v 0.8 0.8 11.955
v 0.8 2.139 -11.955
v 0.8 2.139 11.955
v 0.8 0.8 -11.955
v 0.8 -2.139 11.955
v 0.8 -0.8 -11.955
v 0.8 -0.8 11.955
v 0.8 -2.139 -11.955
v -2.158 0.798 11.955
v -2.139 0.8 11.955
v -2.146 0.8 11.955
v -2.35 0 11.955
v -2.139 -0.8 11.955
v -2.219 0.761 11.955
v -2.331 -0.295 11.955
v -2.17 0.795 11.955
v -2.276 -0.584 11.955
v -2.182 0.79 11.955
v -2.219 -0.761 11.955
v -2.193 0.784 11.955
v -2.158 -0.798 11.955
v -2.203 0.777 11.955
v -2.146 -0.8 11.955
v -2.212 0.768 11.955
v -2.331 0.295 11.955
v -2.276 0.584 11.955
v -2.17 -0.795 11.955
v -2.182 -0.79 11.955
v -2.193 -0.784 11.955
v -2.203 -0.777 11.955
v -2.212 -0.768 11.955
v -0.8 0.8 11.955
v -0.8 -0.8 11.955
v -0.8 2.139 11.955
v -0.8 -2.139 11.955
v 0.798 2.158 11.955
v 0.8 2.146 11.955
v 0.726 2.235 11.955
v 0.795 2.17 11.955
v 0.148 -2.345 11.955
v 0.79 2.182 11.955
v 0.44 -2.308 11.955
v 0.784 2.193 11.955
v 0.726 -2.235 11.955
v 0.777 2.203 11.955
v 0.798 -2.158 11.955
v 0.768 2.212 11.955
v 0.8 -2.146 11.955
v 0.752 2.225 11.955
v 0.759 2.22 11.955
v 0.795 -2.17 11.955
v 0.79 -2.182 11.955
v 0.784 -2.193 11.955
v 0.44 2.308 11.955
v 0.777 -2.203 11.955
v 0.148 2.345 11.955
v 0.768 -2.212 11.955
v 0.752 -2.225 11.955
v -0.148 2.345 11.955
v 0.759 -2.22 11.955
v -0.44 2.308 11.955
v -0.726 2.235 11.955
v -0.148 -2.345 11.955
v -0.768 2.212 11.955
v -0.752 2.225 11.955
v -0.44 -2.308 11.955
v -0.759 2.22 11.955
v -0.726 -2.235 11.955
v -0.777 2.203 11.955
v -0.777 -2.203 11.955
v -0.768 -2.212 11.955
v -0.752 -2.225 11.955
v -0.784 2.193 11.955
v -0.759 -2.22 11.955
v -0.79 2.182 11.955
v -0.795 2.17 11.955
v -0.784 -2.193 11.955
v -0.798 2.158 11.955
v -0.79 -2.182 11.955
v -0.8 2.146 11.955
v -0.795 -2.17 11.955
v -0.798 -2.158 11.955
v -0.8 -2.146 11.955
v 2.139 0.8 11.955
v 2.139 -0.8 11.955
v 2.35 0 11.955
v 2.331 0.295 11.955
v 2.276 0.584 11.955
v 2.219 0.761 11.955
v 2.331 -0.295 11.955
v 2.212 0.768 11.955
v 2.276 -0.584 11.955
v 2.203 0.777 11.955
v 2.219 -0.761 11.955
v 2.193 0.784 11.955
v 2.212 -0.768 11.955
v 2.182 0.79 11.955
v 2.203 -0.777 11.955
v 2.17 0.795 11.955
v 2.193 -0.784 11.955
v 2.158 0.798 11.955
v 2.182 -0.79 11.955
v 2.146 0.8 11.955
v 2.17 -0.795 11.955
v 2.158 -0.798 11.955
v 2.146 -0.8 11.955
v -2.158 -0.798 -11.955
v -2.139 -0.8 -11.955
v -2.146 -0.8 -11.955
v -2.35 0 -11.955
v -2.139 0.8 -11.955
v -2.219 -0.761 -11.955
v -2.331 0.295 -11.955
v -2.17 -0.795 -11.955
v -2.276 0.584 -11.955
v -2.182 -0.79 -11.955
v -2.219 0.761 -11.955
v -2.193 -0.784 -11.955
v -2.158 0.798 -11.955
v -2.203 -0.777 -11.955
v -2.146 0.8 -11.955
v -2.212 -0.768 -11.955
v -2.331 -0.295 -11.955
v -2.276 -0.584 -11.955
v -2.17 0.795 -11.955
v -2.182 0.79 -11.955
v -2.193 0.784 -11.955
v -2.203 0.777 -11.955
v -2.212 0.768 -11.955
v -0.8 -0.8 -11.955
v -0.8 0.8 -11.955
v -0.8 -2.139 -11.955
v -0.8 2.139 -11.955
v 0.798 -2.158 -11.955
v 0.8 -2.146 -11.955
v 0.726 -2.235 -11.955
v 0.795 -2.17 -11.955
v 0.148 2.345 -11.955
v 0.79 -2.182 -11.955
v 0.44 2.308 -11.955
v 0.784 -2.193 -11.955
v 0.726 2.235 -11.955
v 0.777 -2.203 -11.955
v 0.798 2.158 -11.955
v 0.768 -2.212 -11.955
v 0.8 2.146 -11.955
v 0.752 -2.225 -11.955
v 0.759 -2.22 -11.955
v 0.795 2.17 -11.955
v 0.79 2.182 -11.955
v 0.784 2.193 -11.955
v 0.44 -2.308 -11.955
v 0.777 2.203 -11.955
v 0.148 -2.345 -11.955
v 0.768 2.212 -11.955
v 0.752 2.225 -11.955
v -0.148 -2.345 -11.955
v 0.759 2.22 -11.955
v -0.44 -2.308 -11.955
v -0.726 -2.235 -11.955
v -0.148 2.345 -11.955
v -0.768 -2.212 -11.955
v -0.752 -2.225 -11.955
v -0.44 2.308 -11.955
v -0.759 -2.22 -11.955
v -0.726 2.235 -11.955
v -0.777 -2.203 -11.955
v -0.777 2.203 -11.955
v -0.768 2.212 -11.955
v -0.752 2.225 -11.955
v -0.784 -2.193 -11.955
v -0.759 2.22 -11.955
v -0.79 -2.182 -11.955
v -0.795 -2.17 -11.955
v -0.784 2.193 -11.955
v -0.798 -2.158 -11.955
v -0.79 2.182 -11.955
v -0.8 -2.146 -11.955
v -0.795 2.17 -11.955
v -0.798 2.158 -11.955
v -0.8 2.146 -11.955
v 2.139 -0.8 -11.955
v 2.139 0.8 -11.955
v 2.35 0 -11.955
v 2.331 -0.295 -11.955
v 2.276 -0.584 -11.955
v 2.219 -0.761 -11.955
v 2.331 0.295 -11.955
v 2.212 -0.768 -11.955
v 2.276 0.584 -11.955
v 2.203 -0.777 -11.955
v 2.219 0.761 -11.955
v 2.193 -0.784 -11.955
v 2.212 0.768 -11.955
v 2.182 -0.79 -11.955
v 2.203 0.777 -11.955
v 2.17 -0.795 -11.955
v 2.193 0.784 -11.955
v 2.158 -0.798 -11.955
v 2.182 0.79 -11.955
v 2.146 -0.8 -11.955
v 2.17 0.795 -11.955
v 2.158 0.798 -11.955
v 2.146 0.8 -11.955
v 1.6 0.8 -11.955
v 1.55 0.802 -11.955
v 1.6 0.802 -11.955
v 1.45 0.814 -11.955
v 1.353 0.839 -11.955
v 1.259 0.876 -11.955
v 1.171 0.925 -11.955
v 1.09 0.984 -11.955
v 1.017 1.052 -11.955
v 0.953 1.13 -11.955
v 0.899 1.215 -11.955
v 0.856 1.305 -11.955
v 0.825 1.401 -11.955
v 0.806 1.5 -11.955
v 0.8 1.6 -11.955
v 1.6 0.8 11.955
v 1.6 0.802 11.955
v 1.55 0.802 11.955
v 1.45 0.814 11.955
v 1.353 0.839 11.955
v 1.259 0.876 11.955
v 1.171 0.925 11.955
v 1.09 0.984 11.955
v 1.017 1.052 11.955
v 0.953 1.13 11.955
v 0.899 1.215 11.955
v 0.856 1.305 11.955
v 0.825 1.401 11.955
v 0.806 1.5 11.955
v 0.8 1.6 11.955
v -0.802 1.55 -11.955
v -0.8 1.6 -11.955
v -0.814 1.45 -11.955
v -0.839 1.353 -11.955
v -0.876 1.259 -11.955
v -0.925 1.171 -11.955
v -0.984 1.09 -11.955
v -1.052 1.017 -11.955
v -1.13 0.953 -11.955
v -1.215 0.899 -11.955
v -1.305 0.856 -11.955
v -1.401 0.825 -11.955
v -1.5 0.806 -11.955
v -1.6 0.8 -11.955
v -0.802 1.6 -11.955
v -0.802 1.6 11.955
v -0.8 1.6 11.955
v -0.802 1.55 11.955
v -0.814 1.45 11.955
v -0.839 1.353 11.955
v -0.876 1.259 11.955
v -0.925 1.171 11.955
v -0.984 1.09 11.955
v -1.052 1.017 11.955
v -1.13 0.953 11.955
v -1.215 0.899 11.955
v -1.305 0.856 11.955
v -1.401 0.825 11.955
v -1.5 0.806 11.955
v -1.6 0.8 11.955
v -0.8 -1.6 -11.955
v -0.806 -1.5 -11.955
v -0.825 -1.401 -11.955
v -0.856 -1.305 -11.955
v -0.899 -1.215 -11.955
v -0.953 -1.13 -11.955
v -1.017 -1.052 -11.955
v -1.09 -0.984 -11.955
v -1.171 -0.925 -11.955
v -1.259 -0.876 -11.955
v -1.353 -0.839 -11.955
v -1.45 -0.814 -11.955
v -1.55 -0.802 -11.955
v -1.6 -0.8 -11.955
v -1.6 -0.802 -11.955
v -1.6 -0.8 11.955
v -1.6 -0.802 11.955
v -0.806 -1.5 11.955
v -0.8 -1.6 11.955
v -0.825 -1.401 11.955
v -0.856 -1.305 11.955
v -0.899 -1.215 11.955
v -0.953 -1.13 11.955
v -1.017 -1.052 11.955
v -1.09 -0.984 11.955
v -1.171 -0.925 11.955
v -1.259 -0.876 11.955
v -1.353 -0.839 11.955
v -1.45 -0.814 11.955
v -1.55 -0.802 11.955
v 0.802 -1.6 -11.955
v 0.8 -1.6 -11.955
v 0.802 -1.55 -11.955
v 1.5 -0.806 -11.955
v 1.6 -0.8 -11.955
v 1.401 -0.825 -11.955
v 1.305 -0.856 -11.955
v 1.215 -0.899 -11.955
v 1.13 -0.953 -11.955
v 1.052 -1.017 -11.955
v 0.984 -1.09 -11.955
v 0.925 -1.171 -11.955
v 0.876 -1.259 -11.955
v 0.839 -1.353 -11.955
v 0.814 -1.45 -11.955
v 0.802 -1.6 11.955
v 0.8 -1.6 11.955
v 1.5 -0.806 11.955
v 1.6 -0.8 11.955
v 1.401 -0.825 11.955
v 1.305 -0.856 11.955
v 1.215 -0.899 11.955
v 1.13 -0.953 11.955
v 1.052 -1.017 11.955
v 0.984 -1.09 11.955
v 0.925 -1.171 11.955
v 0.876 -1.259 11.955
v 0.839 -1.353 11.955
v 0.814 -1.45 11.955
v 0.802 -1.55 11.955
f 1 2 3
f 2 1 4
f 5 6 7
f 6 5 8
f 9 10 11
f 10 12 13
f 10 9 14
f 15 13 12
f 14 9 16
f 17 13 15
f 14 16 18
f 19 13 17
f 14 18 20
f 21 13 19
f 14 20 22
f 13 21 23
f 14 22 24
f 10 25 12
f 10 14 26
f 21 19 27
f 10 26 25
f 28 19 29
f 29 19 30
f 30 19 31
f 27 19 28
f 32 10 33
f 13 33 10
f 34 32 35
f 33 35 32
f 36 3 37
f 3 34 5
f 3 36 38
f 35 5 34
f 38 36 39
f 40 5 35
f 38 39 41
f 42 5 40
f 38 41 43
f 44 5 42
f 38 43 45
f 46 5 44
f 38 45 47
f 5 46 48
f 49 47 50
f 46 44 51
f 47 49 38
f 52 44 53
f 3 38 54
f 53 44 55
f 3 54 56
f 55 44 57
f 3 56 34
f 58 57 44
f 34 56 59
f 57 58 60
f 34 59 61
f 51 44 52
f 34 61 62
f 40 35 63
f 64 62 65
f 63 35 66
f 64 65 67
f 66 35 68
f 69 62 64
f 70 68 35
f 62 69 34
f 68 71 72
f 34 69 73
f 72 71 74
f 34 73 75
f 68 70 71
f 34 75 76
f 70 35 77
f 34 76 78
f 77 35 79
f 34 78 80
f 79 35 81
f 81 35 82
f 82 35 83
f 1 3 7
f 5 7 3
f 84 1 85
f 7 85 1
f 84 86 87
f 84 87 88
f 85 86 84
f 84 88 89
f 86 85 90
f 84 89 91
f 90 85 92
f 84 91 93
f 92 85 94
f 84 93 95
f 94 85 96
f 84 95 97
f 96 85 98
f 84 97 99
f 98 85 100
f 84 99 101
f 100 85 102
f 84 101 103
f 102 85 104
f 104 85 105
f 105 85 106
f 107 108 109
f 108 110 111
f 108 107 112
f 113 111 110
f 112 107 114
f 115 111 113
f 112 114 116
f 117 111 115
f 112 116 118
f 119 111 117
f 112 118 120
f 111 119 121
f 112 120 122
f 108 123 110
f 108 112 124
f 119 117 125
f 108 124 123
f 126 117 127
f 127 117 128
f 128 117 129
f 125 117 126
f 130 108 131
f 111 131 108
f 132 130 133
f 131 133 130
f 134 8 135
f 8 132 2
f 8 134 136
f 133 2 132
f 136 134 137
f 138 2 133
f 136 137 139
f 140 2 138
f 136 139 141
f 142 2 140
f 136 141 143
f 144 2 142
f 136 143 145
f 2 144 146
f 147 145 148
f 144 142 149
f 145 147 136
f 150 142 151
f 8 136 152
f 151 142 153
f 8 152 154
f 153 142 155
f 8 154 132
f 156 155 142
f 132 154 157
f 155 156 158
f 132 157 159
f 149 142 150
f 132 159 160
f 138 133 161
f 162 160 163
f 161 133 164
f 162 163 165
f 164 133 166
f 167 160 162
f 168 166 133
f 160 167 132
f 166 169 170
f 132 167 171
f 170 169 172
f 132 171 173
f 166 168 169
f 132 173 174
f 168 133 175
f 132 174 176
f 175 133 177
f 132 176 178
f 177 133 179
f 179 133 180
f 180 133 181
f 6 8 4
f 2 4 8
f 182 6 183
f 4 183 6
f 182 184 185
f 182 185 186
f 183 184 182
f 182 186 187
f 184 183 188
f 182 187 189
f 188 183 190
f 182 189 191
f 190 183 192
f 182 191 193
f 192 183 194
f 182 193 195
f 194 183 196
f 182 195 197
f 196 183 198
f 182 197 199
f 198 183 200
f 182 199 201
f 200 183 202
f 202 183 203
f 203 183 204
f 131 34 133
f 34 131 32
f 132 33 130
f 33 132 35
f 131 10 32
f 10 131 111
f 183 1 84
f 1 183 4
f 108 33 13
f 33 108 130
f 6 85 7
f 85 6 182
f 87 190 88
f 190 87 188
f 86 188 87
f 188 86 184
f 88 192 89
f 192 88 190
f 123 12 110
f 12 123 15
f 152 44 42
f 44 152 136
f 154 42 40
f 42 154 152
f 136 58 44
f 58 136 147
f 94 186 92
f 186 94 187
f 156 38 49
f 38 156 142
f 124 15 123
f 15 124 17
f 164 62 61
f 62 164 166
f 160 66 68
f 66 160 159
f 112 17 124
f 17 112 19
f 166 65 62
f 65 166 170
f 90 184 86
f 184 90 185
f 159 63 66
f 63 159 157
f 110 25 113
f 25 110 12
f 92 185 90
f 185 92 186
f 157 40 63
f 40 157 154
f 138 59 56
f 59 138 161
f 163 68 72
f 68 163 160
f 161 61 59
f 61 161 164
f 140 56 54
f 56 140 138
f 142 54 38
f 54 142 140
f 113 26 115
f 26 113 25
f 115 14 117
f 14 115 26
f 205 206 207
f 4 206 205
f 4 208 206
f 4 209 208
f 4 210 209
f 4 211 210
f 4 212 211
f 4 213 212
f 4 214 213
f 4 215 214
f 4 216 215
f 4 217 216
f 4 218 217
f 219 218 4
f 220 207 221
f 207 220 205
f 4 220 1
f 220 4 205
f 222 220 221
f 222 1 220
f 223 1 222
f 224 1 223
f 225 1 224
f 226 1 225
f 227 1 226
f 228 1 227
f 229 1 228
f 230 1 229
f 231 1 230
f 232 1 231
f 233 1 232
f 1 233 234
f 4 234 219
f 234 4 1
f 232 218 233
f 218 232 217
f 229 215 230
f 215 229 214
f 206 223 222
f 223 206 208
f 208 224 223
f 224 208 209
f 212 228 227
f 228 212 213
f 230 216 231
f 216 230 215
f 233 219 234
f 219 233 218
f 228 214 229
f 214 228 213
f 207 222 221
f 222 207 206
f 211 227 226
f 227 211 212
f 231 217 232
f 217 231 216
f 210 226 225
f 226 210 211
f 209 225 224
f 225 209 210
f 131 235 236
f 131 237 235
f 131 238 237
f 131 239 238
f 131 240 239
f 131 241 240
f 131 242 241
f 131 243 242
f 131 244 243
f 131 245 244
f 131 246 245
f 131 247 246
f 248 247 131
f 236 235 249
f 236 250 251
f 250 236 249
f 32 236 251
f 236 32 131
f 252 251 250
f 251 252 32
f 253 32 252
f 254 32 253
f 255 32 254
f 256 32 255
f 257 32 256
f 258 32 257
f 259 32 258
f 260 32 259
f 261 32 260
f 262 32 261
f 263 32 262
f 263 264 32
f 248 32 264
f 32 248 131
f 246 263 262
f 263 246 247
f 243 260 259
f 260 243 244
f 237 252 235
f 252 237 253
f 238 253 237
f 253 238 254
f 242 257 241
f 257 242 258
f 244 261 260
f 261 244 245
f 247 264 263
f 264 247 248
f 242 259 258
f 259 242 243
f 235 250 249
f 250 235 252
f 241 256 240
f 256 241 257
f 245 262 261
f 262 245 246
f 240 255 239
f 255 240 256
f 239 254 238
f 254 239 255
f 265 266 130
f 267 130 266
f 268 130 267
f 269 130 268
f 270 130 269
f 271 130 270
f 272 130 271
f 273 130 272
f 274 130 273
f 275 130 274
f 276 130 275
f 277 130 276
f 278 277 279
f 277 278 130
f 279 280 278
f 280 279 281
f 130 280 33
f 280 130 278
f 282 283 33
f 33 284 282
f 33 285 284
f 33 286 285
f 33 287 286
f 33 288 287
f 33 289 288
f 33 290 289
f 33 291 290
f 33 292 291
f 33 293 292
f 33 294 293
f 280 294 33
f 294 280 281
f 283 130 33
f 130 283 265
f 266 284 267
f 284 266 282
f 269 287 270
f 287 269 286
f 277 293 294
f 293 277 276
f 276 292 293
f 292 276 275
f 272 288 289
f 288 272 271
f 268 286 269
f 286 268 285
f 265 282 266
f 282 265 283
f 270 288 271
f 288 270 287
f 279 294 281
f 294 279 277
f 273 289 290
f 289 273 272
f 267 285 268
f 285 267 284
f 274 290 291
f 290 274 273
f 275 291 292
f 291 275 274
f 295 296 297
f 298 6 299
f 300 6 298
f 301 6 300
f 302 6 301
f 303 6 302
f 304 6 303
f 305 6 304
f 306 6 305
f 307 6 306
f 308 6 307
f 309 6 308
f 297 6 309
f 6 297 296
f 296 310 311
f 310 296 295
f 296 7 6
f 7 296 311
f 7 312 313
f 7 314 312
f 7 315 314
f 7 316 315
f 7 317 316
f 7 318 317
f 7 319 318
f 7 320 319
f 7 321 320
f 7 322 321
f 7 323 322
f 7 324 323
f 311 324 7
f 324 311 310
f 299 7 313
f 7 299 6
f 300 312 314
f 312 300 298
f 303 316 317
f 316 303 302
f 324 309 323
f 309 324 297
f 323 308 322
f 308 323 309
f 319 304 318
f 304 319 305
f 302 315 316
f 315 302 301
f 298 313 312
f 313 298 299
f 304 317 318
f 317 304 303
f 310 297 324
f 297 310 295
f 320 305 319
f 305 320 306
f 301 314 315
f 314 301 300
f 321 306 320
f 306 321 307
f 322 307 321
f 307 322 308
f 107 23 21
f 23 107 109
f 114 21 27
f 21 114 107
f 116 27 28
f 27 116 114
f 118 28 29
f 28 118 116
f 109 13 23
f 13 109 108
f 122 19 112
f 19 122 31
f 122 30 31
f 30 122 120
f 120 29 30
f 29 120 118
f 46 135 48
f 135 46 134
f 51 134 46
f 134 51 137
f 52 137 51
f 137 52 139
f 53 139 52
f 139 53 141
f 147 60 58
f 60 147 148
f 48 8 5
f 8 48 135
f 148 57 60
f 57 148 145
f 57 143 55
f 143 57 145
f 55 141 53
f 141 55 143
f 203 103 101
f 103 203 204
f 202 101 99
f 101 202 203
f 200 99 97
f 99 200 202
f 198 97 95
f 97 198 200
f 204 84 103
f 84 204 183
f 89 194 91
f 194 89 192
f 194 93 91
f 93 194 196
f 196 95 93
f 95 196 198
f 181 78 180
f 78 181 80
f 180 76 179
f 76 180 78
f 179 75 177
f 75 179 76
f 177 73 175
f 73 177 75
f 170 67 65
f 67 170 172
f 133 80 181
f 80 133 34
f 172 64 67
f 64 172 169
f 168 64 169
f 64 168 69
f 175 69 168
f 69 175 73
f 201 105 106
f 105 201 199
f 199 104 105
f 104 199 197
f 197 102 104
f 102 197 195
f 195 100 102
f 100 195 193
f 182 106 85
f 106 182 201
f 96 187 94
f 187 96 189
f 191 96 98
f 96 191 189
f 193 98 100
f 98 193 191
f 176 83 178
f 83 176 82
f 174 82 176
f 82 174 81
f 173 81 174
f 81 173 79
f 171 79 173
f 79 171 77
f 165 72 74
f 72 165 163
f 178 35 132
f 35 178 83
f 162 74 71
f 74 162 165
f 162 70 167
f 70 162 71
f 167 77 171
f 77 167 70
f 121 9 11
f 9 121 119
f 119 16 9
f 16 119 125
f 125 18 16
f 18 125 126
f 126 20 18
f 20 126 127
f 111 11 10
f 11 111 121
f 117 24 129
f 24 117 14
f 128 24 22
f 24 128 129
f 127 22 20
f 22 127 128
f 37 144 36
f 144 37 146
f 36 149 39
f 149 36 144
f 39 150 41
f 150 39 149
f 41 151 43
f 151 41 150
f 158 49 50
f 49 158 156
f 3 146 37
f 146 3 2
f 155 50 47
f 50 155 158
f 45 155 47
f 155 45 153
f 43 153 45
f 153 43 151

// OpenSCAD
$fn = 50;

// Units: mm
lego_u = 7.97;

lego_beam_w = 7.38;
lego_beam_h = 7.76;

lego_pin_hole_d = 4.8;
lego_pin_hole_overhang_d = 6.2;
lego_pin_hole_overhang_h = 0.8;

lego_axle_d = 4.7;
lego_axle_w = 1.6; // Width of one "arm"

lego_axle_outer_r = 0.1;
lego_axle_inner_r = 0.8;

/* minkowski() { */
    Lego_Axle(/*$fn=50,*/ 3*lego_u);
    /* sphere(0.1); */
/* } */
/* Reverse_Fillet($fn=50, 10, 0.5, angle=5); */

// Outer fillets
module Lego_Axle(length) {
    difference() {
        group() {
            intersection() {
                union() {
                    cube([lego_axle_w, lego_axle_d, length], center=true);
                    cube([lego_axle_d, lego_axle_w, length], center=true);
                }
                cylinder(length, d=lego_axle_d, center=true);
            }
            d = sqrt(2*(lego_axle_w/2)^2);
            inner_fillet(d);
        }
        union() {
            d = sqrt((lego_axle_d/2)^2-(lego_axle_w/2)^2);
            a = atan2(lego_axle_w/2, d) + 90;
            outer_fillet(d, a);
            /* mirror([1,0,0]) outer_fillet(d, a); */
        }
    }
    
    module inner_fillet(d) {
        for(i = [0:3]) {
            a = 90*i;
            translate(d*[cos(a+45), sin(a+45), 0]) rotate([0, 0, a]) Reverse_Fillet(length, r_to_inverse(lego_axle_inner_r, 90), angle=90);
        }
    }

    module outer_fillet(d, a) {
        outer_fillet_half(d, a);
        mirror([1, 0, 0]) outer_fillet_half(d, a);
    }
    
    module outer_fillet_half(d, a) {
        for(i = [0:3]) {
            rotate([0, 0, 90*i]) translate([-d, -lego_axle_w/2, 0]) Reverse_Fillet(length, r_to_inverse(lego_axle_outer_r, a), angle=a);
        }
    }
}

module Reverse_Fillet(length, i_r, angle=90) {
    angle = angle % 180;
    r = i_r/(1/sin(angle/2)-1);
    w = sqrt((r+i_r)^2 - r^2);
    corner = [
        [0, 0],
        [w, 0],
        [w, r],
        w*[cos(angle), sin(angle)],
    ];
    
    difference() {
        translate([0, 0, -length/2]) linear_extrude(length) polygon(corner);
        translate([w, r, 0]) cylinder(length, r=r, center=true);
    }
}

function r_to_inverse(r, angle) = r*(1/sin(angle/2)-1);
